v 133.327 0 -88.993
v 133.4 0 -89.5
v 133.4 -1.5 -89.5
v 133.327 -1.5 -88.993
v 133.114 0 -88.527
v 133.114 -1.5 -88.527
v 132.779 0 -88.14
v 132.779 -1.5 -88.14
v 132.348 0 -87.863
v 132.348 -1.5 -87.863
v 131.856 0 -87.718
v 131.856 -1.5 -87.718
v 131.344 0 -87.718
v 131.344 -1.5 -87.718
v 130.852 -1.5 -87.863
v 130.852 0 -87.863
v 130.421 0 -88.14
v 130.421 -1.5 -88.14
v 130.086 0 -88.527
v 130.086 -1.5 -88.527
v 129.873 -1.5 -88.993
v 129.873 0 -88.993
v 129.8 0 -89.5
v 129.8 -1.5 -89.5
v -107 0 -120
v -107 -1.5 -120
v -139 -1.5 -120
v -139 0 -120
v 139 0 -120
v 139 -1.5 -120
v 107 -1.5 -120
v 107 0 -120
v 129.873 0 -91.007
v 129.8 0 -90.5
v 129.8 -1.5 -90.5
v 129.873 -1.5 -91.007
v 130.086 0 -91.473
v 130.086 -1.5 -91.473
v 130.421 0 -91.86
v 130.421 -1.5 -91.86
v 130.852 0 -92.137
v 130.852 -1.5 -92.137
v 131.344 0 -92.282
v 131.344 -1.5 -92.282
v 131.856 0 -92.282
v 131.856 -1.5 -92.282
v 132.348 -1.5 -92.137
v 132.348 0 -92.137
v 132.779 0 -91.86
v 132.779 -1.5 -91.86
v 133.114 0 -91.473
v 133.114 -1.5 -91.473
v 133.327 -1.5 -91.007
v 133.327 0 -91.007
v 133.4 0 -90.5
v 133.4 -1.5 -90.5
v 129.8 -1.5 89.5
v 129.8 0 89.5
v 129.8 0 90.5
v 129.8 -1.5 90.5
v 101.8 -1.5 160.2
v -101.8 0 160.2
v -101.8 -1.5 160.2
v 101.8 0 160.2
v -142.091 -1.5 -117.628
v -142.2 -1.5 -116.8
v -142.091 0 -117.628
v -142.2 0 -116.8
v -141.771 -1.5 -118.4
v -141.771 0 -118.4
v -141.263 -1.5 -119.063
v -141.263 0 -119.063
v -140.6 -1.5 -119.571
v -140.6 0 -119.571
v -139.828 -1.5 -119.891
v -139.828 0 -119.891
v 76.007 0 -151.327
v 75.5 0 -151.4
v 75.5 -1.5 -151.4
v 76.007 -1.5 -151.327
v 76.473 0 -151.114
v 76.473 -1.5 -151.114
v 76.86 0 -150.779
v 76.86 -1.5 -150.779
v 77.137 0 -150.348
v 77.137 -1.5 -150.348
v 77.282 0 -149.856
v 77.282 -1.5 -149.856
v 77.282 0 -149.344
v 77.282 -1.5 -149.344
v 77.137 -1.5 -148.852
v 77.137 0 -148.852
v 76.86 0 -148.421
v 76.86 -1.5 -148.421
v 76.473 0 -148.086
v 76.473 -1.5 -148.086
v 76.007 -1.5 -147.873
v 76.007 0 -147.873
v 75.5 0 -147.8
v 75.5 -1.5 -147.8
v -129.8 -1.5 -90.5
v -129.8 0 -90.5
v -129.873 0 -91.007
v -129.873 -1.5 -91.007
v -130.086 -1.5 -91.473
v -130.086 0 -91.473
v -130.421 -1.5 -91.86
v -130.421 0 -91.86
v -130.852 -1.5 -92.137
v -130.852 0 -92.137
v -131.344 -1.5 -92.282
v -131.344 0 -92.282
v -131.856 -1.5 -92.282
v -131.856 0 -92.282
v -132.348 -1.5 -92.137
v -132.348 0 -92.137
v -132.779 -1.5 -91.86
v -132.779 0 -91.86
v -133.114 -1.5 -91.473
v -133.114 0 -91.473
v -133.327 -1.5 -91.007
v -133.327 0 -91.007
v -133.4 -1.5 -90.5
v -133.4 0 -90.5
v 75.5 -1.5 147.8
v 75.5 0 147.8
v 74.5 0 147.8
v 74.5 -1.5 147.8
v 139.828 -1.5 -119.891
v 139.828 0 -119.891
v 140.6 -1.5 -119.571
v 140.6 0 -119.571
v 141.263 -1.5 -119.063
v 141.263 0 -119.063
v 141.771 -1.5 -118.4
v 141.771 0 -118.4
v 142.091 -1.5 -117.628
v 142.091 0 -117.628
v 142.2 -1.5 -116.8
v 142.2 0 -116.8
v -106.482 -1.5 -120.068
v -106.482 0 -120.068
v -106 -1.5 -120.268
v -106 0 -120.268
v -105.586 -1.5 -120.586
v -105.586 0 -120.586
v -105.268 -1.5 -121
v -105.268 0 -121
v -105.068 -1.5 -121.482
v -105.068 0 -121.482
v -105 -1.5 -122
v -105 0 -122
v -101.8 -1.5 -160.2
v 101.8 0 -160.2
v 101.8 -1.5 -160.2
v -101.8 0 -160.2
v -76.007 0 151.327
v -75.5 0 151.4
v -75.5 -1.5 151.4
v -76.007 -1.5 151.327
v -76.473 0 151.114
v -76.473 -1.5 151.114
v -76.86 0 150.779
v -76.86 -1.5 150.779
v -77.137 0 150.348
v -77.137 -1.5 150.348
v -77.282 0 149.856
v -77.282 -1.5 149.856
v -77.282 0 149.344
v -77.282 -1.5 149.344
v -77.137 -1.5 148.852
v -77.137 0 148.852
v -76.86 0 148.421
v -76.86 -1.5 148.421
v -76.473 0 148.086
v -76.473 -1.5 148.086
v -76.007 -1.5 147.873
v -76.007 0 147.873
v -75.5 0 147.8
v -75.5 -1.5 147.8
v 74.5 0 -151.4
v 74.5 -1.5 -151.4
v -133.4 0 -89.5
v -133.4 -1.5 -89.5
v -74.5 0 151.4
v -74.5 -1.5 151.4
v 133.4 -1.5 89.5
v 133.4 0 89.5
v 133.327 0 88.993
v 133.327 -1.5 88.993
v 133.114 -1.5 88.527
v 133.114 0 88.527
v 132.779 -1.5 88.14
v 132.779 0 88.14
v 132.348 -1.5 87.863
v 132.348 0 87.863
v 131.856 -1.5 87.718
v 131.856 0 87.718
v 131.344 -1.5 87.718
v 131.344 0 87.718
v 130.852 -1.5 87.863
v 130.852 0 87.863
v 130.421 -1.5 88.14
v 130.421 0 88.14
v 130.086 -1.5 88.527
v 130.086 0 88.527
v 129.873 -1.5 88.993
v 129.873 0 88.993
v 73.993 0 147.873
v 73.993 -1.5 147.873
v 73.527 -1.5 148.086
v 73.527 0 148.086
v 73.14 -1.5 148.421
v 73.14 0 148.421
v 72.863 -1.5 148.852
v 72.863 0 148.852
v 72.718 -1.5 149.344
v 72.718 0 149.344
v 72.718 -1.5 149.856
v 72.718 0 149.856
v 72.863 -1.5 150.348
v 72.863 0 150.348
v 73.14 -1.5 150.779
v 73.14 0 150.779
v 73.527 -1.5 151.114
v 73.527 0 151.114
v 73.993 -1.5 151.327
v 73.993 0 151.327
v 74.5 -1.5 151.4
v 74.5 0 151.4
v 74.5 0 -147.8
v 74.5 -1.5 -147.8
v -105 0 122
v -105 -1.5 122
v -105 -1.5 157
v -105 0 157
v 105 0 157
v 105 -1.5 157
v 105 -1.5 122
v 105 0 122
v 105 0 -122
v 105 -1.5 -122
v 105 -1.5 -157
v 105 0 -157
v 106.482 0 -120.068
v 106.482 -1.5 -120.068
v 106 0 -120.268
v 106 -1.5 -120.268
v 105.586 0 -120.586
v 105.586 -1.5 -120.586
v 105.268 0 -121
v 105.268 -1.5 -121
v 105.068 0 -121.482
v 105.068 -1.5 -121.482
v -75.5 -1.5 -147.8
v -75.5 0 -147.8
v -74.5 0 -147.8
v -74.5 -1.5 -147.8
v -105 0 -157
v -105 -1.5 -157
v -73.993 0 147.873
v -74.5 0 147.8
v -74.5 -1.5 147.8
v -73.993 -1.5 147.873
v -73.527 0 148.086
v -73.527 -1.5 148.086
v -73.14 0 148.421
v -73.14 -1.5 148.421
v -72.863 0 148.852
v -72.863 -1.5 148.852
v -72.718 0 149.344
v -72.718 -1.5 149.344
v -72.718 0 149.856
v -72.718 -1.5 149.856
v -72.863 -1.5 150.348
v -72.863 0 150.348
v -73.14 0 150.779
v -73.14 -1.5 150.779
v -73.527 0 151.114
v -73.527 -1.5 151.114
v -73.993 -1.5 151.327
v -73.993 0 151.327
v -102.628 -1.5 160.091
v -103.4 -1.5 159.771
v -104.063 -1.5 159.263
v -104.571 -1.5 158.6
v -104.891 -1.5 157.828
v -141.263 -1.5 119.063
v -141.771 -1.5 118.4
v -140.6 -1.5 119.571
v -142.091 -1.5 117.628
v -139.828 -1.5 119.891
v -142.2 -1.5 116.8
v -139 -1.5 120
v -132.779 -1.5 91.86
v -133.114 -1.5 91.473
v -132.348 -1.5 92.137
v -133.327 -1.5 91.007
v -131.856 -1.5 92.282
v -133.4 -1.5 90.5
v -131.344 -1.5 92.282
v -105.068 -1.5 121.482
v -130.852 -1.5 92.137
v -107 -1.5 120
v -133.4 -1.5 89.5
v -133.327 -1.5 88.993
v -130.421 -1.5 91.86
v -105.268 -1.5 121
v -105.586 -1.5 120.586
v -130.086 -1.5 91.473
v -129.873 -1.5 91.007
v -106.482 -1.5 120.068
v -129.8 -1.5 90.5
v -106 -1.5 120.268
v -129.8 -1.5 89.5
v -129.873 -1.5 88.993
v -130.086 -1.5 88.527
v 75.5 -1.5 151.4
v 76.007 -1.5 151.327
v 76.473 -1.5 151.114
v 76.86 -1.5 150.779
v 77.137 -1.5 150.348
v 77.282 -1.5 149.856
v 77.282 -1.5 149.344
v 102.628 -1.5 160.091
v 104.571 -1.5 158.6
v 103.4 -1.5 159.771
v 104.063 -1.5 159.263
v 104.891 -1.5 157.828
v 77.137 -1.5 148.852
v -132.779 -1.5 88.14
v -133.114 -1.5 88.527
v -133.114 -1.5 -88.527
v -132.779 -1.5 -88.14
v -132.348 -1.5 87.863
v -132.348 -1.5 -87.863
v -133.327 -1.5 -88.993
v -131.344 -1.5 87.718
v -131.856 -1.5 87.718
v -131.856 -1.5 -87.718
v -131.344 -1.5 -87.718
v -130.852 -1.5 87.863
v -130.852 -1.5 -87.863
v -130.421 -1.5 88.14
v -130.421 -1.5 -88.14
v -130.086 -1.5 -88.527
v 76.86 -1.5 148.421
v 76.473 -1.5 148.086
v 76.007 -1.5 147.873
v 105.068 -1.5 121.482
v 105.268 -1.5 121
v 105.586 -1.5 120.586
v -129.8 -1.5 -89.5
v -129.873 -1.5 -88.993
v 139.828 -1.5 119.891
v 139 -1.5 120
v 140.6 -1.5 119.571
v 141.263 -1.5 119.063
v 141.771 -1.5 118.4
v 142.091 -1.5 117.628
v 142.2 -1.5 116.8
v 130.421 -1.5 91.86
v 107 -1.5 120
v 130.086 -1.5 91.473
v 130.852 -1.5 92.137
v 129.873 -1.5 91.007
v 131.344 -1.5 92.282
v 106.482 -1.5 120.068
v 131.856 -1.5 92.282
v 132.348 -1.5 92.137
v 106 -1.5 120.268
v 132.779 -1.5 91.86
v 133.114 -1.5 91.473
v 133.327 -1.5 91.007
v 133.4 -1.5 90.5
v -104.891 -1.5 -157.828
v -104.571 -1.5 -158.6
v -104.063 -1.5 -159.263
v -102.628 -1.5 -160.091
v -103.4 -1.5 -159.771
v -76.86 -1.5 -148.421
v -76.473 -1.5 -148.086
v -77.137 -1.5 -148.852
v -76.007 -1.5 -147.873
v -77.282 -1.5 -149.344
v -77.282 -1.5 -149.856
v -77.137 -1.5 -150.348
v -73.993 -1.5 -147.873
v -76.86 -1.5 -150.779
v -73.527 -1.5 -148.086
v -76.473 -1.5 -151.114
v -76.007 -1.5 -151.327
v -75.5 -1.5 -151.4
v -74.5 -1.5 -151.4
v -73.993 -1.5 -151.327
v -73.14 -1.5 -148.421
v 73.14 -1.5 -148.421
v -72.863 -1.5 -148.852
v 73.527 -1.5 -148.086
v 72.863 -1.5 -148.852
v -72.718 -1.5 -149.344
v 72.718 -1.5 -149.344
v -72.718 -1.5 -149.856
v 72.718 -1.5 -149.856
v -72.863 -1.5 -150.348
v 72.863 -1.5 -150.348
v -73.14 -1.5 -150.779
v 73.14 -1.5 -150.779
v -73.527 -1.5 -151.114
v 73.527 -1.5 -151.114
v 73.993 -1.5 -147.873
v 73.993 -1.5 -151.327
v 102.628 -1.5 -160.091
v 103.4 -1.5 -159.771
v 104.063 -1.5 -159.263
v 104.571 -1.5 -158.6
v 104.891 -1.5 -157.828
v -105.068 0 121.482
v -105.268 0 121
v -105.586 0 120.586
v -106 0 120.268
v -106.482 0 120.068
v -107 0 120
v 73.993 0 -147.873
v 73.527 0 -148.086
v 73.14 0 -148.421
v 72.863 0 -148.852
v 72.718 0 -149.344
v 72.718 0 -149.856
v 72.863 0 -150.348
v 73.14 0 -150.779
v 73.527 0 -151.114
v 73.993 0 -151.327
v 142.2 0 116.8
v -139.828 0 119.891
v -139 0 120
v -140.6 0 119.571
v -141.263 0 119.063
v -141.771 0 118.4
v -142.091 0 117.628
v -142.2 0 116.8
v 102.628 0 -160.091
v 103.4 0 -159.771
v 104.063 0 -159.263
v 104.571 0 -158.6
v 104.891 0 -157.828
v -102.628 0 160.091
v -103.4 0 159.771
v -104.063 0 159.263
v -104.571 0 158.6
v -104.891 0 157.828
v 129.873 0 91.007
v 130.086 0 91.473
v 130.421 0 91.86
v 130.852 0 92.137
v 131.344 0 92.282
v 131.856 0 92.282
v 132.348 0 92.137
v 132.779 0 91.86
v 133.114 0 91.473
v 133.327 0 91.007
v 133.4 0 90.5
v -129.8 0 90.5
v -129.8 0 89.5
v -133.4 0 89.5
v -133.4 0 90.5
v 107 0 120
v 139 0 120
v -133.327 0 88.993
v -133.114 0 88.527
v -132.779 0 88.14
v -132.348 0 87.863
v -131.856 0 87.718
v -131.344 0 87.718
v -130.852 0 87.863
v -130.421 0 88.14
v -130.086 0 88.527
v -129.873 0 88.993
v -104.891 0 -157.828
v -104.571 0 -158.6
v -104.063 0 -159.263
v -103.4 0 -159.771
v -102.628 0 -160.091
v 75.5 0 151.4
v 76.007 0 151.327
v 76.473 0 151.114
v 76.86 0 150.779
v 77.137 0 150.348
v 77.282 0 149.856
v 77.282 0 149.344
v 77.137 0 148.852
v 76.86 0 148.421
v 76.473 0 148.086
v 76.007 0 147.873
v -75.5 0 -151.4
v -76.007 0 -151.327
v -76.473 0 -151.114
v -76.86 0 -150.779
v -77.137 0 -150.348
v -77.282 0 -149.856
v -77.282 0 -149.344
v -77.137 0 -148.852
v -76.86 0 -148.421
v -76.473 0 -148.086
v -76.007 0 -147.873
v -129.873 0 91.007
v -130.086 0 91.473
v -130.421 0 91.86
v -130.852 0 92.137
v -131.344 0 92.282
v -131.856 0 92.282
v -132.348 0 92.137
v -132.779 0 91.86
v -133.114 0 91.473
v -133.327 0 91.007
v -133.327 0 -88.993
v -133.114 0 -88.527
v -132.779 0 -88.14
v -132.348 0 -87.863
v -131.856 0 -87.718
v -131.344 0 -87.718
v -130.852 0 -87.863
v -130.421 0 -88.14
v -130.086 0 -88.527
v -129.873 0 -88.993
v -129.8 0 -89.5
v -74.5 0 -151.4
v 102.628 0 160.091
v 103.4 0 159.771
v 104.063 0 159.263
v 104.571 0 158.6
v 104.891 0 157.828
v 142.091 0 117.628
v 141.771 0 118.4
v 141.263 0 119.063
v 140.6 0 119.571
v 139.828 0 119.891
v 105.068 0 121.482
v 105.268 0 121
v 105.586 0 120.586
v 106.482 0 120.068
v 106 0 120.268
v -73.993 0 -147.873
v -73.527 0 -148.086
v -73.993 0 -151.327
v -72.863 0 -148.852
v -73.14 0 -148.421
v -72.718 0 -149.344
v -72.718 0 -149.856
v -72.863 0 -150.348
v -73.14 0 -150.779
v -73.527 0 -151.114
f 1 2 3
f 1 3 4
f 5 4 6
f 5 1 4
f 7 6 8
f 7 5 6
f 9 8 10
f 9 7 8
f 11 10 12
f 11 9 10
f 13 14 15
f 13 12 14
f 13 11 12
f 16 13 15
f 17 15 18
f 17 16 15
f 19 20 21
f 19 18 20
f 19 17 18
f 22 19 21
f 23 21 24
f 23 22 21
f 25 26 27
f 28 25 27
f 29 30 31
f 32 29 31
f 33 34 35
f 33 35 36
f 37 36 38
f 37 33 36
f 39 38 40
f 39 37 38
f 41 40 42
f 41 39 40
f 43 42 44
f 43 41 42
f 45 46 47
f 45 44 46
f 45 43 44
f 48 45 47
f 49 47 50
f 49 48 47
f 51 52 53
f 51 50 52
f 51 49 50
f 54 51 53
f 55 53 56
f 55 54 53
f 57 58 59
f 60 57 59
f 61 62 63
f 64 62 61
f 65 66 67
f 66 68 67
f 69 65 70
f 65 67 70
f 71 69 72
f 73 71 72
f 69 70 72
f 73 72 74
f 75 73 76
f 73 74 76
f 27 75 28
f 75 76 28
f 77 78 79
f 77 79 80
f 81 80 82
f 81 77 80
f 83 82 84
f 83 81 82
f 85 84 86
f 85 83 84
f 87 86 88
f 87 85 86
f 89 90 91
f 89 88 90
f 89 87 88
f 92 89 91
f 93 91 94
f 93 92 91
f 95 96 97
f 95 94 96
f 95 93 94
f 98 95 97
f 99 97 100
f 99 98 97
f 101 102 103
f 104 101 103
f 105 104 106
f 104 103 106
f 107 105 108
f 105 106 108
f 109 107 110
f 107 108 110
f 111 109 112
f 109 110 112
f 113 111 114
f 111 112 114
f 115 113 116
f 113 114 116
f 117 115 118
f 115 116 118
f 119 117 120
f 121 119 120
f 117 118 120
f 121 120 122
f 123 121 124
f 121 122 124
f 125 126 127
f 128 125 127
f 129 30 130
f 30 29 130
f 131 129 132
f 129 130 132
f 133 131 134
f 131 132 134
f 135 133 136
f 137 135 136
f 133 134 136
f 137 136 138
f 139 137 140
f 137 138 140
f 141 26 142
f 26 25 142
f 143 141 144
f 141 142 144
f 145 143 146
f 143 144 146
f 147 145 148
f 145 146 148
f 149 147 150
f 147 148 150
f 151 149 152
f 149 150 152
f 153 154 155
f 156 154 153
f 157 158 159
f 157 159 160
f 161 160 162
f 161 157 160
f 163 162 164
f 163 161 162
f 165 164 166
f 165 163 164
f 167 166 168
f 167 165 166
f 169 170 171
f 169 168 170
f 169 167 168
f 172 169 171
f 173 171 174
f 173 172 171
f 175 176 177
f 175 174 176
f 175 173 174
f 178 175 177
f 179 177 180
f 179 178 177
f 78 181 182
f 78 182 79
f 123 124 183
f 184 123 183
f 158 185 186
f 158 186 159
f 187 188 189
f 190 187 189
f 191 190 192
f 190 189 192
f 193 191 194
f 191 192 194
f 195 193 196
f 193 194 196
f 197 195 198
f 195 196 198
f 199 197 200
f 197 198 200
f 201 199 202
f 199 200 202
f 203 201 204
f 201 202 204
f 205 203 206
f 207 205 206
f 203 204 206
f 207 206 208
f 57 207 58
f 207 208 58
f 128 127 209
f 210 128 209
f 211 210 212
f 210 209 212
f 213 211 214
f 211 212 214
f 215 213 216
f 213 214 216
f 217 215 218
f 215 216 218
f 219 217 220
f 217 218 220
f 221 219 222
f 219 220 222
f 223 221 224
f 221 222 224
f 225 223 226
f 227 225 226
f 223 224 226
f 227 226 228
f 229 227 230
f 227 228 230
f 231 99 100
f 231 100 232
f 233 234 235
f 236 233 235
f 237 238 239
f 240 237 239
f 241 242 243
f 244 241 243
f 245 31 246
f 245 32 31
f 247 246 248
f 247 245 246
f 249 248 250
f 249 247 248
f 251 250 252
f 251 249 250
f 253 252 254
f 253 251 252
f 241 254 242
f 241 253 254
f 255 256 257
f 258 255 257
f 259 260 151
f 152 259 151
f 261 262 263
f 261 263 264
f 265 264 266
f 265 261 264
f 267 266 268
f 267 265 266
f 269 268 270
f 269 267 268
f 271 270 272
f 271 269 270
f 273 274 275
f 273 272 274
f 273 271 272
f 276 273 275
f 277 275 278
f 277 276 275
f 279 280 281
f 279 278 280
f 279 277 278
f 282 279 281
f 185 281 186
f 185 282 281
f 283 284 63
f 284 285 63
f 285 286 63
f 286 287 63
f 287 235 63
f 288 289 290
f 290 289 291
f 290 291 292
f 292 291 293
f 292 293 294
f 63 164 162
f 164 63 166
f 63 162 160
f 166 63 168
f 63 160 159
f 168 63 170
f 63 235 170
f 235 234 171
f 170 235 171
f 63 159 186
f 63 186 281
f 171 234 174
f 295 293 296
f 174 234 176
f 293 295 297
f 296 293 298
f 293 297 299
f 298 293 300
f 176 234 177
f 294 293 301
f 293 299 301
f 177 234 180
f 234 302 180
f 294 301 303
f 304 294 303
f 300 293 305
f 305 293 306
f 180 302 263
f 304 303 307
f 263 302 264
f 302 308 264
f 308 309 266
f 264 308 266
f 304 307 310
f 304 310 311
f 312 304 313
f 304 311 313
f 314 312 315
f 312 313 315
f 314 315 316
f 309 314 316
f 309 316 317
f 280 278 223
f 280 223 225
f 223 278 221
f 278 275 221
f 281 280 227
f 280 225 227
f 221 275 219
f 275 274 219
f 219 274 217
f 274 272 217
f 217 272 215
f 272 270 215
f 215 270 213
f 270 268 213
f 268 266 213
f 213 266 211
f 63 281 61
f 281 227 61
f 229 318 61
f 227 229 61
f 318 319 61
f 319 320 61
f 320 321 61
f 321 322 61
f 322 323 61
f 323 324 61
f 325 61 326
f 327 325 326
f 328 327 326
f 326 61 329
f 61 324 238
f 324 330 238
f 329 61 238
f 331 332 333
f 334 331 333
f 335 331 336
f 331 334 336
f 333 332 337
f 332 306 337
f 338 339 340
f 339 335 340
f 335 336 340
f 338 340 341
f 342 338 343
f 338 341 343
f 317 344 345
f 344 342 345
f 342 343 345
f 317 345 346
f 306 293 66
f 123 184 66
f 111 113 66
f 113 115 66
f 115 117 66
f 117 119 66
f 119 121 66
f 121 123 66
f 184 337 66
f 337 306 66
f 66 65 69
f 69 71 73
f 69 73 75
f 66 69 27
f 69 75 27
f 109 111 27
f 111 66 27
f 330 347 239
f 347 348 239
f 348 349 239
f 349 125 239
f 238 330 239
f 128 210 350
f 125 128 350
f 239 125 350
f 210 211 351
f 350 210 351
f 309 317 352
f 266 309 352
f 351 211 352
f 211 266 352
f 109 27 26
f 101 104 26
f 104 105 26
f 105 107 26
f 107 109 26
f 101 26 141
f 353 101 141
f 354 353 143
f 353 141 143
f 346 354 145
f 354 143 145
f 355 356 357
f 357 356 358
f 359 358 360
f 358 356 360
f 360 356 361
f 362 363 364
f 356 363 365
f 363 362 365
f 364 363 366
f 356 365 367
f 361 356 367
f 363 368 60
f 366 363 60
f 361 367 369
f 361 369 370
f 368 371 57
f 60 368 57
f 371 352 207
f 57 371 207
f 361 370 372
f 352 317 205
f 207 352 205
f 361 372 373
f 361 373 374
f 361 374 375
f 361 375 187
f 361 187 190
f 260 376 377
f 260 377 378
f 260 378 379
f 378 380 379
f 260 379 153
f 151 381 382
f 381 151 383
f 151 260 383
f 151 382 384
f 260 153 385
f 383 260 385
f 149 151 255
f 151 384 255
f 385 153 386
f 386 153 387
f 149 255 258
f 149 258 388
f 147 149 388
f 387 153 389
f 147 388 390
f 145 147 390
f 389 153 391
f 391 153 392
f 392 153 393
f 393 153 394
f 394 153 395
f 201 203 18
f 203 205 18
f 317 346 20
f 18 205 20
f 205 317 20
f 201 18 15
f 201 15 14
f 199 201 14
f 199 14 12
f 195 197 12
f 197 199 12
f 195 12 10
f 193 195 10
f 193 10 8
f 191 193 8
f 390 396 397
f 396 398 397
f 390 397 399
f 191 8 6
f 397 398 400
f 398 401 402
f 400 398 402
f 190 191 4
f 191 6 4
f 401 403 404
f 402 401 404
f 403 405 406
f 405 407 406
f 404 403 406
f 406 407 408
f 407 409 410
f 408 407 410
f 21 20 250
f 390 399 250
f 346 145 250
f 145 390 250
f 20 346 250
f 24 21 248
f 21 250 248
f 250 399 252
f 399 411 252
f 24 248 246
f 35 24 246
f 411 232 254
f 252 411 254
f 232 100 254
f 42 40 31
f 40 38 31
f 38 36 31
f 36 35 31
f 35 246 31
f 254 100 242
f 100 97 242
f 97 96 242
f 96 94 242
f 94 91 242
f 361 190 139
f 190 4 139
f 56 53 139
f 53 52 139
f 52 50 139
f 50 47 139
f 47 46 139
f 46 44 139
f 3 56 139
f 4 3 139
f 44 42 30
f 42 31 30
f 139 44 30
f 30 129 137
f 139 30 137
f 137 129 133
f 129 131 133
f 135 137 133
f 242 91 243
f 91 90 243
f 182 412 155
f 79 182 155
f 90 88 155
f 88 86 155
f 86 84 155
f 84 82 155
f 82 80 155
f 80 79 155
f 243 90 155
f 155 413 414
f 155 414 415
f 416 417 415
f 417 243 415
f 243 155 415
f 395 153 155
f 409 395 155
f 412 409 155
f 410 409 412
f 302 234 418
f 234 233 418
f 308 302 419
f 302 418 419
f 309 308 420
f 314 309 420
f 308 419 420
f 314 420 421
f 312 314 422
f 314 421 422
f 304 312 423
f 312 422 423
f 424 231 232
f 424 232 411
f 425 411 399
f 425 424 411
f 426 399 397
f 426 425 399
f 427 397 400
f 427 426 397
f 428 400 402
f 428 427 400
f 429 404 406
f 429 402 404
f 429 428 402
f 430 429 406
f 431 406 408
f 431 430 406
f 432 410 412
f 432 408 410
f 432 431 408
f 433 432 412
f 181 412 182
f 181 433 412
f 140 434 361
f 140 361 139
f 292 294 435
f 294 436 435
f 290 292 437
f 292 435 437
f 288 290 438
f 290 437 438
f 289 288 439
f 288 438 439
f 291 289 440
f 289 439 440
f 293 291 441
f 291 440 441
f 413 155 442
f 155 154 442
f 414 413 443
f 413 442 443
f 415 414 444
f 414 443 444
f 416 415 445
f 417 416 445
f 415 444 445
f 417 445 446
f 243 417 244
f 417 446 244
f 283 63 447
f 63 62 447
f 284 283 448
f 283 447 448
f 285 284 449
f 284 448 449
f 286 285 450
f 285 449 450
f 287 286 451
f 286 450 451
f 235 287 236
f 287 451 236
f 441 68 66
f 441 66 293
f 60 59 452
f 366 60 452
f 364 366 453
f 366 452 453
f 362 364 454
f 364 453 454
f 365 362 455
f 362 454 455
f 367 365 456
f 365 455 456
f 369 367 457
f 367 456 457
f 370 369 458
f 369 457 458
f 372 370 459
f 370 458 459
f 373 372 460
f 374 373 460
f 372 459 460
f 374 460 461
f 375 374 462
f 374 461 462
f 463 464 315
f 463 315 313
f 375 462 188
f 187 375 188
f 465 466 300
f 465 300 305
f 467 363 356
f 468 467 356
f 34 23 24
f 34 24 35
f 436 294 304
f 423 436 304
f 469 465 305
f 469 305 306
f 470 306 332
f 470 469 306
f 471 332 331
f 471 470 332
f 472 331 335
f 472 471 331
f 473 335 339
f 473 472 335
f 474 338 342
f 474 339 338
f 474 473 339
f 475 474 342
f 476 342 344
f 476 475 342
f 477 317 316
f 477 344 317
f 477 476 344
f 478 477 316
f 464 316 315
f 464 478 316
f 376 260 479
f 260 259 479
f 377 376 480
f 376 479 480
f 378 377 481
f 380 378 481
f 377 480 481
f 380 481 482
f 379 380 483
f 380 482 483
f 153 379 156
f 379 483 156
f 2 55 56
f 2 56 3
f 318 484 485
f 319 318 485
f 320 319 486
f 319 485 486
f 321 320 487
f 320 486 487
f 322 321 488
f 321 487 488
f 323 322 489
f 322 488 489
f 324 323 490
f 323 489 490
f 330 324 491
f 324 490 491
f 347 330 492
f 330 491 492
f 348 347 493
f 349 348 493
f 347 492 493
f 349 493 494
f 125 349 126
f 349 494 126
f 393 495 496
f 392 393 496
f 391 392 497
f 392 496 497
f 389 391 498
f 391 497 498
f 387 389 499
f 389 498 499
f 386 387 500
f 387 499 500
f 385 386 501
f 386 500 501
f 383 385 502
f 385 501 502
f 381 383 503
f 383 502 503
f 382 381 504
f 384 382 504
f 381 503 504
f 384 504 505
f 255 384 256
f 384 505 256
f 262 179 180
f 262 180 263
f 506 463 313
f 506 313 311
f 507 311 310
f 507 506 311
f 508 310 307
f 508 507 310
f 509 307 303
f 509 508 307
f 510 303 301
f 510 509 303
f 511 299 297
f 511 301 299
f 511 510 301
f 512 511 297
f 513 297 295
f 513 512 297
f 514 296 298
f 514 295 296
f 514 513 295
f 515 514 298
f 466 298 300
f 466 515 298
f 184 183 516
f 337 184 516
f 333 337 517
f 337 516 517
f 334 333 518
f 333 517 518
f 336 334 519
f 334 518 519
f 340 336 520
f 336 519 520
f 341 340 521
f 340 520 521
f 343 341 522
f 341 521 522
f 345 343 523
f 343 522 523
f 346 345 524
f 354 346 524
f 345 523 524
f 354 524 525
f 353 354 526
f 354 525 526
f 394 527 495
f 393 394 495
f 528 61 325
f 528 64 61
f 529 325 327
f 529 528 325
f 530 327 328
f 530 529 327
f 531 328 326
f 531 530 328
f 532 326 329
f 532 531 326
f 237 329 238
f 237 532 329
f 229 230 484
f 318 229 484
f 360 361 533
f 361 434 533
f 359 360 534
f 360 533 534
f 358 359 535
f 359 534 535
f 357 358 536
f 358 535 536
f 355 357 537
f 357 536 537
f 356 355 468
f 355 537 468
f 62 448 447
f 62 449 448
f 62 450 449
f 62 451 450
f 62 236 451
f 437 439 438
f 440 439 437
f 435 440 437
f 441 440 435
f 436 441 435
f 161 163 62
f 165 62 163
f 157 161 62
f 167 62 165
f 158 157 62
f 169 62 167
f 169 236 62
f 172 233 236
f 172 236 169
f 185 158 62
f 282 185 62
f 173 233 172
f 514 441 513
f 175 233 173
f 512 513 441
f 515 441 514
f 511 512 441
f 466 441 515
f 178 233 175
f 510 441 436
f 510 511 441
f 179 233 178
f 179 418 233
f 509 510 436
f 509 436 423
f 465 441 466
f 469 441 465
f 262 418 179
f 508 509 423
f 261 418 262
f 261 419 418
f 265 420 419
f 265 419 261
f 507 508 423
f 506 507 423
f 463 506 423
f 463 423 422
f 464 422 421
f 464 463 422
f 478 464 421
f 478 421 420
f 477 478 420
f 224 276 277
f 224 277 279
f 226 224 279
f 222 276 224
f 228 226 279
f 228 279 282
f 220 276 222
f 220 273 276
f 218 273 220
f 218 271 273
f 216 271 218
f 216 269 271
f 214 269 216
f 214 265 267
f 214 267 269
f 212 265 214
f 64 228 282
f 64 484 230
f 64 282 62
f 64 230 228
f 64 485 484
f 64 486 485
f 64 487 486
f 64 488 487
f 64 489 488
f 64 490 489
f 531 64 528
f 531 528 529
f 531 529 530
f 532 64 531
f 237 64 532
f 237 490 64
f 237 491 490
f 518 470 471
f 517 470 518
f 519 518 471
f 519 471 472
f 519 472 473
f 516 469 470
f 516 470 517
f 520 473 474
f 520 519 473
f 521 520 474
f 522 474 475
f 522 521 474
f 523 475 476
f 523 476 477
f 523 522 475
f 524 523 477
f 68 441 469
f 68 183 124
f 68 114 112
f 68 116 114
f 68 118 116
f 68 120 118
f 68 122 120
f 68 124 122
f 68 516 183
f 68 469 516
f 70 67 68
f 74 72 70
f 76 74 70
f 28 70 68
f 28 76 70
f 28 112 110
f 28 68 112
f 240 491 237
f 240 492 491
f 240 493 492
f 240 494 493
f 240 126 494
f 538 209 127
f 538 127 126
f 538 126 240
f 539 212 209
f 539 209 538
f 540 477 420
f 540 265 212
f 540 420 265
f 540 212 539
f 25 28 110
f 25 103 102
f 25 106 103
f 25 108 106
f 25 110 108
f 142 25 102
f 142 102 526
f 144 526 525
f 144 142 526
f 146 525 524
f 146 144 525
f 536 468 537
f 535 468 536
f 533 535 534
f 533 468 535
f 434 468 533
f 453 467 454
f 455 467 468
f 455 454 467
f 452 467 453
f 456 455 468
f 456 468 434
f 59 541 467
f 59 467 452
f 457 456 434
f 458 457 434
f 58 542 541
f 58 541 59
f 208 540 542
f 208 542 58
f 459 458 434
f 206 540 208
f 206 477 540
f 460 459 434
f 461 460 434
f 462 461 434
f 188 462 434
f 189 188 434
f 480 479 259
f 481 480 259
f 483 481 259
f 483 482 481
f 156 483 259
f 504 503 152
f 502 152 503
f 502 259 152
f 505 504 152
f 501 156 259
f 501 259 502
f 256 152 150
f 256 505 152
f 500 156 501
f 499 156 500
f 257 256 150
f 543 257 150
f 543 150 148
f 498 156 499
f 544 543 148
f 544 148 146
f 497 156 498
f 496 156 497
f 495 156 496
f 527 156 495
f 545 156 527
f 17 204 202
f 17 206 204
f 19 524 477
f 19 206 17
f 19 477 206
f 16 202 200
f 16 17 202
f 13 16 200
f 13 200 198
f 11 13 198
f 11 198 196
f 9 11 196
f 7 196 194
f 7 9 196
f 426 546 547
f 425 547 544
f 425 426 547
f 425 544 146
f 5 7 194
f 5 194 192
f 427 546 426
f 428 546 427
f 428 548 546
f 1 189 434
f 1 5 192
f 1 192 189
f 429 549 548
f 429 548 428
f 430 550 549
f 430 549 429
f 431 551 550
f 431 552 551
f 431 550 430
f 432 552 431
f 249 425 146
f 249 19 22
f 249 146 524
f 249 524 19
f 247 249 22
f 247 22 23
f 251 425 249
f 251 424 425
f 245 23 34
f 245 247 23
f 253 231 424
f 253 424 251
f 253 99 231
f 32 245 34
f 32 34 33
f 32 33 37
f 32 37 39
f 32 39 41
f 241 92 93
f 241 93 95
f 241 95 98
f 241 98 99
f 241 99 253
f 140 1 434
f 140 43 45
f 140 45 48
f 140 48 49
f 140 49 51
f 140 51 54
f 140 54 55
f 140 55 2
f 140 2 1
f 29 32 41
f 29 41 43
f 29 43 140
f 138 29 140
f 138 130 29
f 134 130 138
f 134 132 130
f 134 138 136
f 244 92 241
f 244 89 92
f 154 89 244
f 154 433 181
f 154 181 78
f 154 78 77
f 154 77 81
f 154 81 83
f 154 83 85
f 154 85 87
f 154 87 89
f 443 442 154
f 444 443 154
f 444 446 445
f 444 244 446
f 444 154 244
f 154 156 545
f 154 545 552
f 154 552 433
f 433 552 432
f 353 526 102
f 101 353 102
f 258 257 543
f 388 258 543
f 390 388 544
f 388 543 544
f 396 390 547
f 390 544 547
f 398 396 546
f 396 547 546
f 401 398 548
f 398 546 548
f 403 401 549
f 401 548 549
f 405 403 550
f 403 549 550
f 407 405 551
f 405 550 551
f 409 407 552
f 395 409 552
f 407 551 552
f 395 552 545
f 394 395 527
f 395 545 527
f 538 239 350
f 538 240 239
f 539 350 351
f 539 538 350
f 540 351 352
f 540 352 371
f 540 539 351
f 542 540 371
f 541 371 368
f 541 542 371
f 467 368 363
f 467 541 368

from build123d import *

# Parameters (mm, degrees)
SM_BASE_FLANGE_1_DEPTH = 1.5
CUT_EXTRUDE_1_DEPTH    = 215.212814743
FILLET_1_R             = 3.2
FILLET_3_R             = 2
CUT_EXTRUDE_2_DEPTH    = 10


# Sheet-metal steps are written as plain solids
with BuildPart() as part:
    # Sketch 1 → Базовая кромка1 (new body)
    with BuildSketch(Plane(origin=(0, 0, 0), x_dir=(1, 0, 0), z_dir=(0, 1, 0))):
        with BuildLine():
            Line((-112.2, -160.2), (112.2, -160.2))
            ThreePointArc((112.2, -160.2), (133.413203436, -151.413203436), (142.2, -130.2))
            Line((142.2, -130.2), (142.2, 130.2))
            ThreePointArc((142.2, 130.2), (133.413203436, 151.413203436), (112.2, 160.2))
            Line((112.2, 160.2), (-112.2, 160.2))
            ThreePointArc((-112.2, 160.2), (-133.413203436, 151.413203436), (-142.2, 130.2))
            Line((-142.2, 130.2), (-142.2, -130.2))
            ThreePointArc((-142.2, -130.2), (-133.413203436, -151.413203436), (-112.2, -160.2))
        make_face()
    extrude(amount=-SM_BASE_FLANGE_1_DEPTH)

    # Sketch 2 → Вырез-Вытянуть1 (cut, through all)
    with BuildSketch(Plane.XZ.offset(1.5)):
        with BuildLine():
            Line((105, 120), (142.2, 120))
            Line((142.2, 120), (142.2, 130.2))
            ThreePointArc((142.2, 130.2), (133.413203436, 151.413203436), (112.2, 160.2))
            Line((112.2, 160.2), (105, 160.2))
            Line((105, 160.2), (105, 120))
        make_face()
        with BuildLine():
            Line((142.2, -130.2), (142.2, -120))
            Line((142.2, -120), (105, -120))
            Line((105, -120), (105, -160.2))
            Line((105, -160.2), (112.2, -160.2))
            ThreePointArc((112.2, -160.2), (133.413203436, -151.413203436), (142.2, -130.2))
        make_face()
        with BuildLine():
            Line((-112.2, -160.2), (-105, -160.2))
            Line((-105, -160.2), (-105, -120))
            Line((-105, -120), (-142.2, -120))
            Line((-142.2, -120), (-142.2, -130.2))
            ThreePointArc((-142.2, -130.2), (-133.413203436, -151.413203436), (-112.2, -160.2))
        make_face()
        with BuildLine():
            Line((-105, 120), (-105, 160.2))
            Line((-105, 160.2), (-112.2, 160.2))
            ThreePointArc((-112.2, 160.2), (-133.413203436, 151.413203436), (-142.2, 130.2))
            Line((-142.2, 130.2), (-142.2, 120))
            Line((-142.2, 120), (-105, 120))
        make_face()
    extrude(amount=-CUT_EXTRUDE_1_DEPTH, mode=Mode.SUBTRACT)

    # Скругление1
    fillet_1_edges = [part.edges().sort_by_distance(p)[0] for p in [
        (-142.2, -0.75, 120),
        (-105, -0.75, 160.2),
        (-105, -0.75, -160.2),
        (-142.2, -0.75, -120),
        (105, -0.75, -160.2),
        (142.2, -0.75, -120),
        (105, -0.75, 160.2),
        (142.2, -0.75, 120),
    ]]
    fillet(fillet_1_edges, radius=FILLET_1_R)

    # Скругление3
    fillet_3_edges = [part.edges().sort_by_distance(p)[0] for p in [
        (-105, -0.75, 120),
        (-105, -0.75, -120),
        (105, -0.75, -120),
        (105, -0.75, 120),
    ]]
    fillet(fillet_3_edges, radius=FILLET_3_R)

    # Эскиз4 → Вырез-Вытянуть2 (cut)
    with BuildSketch(Plane(origin=(0, 0, 0), x_dir=(1, 0, 0), z_dir=(0, 1, 0))):
        with BuildLine():
            Line((-133.4, -90.5), (-133.4, -89.5))
            ThreePointArc((-133.4, -89.5), (-131.6, -87.7), (-129.8, -89.5))
            Line((-129.8, -89.5), (-129.8, -90.5))
            ThreePointArc((-129.8, -90.5), (-131.6, -92.3), (-133.4, -90.5))
        make_face()
        with BuildLine():
            Line((-74.5, -151.4), (-75.5, -151.4))
            ThreePointArc((-75.5, -151.4), (-77.3, -149.6), (-75.5, -147.8))
            Line((-75.5, -147.8), (-74.5, -147.8))
            ThreePointArc((-74.5, -147.8), (-72.7, -149.6), (-74.5, -151.4))
        make_face()
        with BuildLine():
            Line((-74.5, 151.4), (-75.5, 151.4))
            ThreePointArc((-75.5, 151.4), (-77.3, 149.6), (-75.5, 147.8))
            Line((-75.5, 147.8), (-74.5, 147.8))
            ThreePointArc((-74.5, 147.8), (-72.7, 149.6), (-74.5, 151.4))
        make_face()
        with BuildLine():
            Line((-133.4, 90.5), (-133.4, 89.5))
            ThreePointArc((-133.4, 89.5), (-131.6, 87.7), (-129.8, 89.5))
            Line((-129.8, 89.5), (-129.8, 90.5))
            ThreePointArc((-129.8, 90.5), (-131.6, 92.3), (-133.4, 90.5))
        make_face()
        with BuildLine():
            Line((74.5, 151.4), (75.5, 151.4))
            ThreePointArc((75.5, 151.4), (77.3, 149.6), (75.5, 147.8))
            Line((75.5, 147.8), (74.5, 147.8))
            ThreePointArc((74.5, 147.8), (72.7, 149.6), (74.5, 151.4))
        make_face()
        with BuildLine():
            Line((133.4, 90.5), (133.4, 89.5))
            ThreePointArc((133.4, 89.5), (131.6, 87.7), (129.8, 89.5))
            Line((129.8, 89.5), (129.8, 90.5))
            ThreePointArc((129.8, 90.5), (131.6, 92.3), (133.4, 90.5))
        make_face()
        with BuildLine():
            Line((133.4, -90.5), (133.4, -89.5))
            ThreePointArc((133.4, -89.5), (131.6, -87.7), (129.8, -89.5))
            Line((129.8, -89.5), (129.8, -90.5))
            ThreePointArc((129.8, -90.5), (131.6, -92.3), (133.4, -90.5))
        make_face()
        with BuildLine():
            Line((74.5, -151.4), (75.5, -151.4))
            ThreePointArc((75.5, -151.4), (77.3, -149.6), (75.5, -147.8))
            Line((75.5, -147.8), (74.5, -147.8))
            ThreePointArc((74.5, -147.8), (72.7, -149.6), (74.5, -151.4))
        make_face()
    extrude(amount=-CUT_EXTRUDE_2_DEPTH, mode=Mode.SUBTRACT)


solid = part.part
